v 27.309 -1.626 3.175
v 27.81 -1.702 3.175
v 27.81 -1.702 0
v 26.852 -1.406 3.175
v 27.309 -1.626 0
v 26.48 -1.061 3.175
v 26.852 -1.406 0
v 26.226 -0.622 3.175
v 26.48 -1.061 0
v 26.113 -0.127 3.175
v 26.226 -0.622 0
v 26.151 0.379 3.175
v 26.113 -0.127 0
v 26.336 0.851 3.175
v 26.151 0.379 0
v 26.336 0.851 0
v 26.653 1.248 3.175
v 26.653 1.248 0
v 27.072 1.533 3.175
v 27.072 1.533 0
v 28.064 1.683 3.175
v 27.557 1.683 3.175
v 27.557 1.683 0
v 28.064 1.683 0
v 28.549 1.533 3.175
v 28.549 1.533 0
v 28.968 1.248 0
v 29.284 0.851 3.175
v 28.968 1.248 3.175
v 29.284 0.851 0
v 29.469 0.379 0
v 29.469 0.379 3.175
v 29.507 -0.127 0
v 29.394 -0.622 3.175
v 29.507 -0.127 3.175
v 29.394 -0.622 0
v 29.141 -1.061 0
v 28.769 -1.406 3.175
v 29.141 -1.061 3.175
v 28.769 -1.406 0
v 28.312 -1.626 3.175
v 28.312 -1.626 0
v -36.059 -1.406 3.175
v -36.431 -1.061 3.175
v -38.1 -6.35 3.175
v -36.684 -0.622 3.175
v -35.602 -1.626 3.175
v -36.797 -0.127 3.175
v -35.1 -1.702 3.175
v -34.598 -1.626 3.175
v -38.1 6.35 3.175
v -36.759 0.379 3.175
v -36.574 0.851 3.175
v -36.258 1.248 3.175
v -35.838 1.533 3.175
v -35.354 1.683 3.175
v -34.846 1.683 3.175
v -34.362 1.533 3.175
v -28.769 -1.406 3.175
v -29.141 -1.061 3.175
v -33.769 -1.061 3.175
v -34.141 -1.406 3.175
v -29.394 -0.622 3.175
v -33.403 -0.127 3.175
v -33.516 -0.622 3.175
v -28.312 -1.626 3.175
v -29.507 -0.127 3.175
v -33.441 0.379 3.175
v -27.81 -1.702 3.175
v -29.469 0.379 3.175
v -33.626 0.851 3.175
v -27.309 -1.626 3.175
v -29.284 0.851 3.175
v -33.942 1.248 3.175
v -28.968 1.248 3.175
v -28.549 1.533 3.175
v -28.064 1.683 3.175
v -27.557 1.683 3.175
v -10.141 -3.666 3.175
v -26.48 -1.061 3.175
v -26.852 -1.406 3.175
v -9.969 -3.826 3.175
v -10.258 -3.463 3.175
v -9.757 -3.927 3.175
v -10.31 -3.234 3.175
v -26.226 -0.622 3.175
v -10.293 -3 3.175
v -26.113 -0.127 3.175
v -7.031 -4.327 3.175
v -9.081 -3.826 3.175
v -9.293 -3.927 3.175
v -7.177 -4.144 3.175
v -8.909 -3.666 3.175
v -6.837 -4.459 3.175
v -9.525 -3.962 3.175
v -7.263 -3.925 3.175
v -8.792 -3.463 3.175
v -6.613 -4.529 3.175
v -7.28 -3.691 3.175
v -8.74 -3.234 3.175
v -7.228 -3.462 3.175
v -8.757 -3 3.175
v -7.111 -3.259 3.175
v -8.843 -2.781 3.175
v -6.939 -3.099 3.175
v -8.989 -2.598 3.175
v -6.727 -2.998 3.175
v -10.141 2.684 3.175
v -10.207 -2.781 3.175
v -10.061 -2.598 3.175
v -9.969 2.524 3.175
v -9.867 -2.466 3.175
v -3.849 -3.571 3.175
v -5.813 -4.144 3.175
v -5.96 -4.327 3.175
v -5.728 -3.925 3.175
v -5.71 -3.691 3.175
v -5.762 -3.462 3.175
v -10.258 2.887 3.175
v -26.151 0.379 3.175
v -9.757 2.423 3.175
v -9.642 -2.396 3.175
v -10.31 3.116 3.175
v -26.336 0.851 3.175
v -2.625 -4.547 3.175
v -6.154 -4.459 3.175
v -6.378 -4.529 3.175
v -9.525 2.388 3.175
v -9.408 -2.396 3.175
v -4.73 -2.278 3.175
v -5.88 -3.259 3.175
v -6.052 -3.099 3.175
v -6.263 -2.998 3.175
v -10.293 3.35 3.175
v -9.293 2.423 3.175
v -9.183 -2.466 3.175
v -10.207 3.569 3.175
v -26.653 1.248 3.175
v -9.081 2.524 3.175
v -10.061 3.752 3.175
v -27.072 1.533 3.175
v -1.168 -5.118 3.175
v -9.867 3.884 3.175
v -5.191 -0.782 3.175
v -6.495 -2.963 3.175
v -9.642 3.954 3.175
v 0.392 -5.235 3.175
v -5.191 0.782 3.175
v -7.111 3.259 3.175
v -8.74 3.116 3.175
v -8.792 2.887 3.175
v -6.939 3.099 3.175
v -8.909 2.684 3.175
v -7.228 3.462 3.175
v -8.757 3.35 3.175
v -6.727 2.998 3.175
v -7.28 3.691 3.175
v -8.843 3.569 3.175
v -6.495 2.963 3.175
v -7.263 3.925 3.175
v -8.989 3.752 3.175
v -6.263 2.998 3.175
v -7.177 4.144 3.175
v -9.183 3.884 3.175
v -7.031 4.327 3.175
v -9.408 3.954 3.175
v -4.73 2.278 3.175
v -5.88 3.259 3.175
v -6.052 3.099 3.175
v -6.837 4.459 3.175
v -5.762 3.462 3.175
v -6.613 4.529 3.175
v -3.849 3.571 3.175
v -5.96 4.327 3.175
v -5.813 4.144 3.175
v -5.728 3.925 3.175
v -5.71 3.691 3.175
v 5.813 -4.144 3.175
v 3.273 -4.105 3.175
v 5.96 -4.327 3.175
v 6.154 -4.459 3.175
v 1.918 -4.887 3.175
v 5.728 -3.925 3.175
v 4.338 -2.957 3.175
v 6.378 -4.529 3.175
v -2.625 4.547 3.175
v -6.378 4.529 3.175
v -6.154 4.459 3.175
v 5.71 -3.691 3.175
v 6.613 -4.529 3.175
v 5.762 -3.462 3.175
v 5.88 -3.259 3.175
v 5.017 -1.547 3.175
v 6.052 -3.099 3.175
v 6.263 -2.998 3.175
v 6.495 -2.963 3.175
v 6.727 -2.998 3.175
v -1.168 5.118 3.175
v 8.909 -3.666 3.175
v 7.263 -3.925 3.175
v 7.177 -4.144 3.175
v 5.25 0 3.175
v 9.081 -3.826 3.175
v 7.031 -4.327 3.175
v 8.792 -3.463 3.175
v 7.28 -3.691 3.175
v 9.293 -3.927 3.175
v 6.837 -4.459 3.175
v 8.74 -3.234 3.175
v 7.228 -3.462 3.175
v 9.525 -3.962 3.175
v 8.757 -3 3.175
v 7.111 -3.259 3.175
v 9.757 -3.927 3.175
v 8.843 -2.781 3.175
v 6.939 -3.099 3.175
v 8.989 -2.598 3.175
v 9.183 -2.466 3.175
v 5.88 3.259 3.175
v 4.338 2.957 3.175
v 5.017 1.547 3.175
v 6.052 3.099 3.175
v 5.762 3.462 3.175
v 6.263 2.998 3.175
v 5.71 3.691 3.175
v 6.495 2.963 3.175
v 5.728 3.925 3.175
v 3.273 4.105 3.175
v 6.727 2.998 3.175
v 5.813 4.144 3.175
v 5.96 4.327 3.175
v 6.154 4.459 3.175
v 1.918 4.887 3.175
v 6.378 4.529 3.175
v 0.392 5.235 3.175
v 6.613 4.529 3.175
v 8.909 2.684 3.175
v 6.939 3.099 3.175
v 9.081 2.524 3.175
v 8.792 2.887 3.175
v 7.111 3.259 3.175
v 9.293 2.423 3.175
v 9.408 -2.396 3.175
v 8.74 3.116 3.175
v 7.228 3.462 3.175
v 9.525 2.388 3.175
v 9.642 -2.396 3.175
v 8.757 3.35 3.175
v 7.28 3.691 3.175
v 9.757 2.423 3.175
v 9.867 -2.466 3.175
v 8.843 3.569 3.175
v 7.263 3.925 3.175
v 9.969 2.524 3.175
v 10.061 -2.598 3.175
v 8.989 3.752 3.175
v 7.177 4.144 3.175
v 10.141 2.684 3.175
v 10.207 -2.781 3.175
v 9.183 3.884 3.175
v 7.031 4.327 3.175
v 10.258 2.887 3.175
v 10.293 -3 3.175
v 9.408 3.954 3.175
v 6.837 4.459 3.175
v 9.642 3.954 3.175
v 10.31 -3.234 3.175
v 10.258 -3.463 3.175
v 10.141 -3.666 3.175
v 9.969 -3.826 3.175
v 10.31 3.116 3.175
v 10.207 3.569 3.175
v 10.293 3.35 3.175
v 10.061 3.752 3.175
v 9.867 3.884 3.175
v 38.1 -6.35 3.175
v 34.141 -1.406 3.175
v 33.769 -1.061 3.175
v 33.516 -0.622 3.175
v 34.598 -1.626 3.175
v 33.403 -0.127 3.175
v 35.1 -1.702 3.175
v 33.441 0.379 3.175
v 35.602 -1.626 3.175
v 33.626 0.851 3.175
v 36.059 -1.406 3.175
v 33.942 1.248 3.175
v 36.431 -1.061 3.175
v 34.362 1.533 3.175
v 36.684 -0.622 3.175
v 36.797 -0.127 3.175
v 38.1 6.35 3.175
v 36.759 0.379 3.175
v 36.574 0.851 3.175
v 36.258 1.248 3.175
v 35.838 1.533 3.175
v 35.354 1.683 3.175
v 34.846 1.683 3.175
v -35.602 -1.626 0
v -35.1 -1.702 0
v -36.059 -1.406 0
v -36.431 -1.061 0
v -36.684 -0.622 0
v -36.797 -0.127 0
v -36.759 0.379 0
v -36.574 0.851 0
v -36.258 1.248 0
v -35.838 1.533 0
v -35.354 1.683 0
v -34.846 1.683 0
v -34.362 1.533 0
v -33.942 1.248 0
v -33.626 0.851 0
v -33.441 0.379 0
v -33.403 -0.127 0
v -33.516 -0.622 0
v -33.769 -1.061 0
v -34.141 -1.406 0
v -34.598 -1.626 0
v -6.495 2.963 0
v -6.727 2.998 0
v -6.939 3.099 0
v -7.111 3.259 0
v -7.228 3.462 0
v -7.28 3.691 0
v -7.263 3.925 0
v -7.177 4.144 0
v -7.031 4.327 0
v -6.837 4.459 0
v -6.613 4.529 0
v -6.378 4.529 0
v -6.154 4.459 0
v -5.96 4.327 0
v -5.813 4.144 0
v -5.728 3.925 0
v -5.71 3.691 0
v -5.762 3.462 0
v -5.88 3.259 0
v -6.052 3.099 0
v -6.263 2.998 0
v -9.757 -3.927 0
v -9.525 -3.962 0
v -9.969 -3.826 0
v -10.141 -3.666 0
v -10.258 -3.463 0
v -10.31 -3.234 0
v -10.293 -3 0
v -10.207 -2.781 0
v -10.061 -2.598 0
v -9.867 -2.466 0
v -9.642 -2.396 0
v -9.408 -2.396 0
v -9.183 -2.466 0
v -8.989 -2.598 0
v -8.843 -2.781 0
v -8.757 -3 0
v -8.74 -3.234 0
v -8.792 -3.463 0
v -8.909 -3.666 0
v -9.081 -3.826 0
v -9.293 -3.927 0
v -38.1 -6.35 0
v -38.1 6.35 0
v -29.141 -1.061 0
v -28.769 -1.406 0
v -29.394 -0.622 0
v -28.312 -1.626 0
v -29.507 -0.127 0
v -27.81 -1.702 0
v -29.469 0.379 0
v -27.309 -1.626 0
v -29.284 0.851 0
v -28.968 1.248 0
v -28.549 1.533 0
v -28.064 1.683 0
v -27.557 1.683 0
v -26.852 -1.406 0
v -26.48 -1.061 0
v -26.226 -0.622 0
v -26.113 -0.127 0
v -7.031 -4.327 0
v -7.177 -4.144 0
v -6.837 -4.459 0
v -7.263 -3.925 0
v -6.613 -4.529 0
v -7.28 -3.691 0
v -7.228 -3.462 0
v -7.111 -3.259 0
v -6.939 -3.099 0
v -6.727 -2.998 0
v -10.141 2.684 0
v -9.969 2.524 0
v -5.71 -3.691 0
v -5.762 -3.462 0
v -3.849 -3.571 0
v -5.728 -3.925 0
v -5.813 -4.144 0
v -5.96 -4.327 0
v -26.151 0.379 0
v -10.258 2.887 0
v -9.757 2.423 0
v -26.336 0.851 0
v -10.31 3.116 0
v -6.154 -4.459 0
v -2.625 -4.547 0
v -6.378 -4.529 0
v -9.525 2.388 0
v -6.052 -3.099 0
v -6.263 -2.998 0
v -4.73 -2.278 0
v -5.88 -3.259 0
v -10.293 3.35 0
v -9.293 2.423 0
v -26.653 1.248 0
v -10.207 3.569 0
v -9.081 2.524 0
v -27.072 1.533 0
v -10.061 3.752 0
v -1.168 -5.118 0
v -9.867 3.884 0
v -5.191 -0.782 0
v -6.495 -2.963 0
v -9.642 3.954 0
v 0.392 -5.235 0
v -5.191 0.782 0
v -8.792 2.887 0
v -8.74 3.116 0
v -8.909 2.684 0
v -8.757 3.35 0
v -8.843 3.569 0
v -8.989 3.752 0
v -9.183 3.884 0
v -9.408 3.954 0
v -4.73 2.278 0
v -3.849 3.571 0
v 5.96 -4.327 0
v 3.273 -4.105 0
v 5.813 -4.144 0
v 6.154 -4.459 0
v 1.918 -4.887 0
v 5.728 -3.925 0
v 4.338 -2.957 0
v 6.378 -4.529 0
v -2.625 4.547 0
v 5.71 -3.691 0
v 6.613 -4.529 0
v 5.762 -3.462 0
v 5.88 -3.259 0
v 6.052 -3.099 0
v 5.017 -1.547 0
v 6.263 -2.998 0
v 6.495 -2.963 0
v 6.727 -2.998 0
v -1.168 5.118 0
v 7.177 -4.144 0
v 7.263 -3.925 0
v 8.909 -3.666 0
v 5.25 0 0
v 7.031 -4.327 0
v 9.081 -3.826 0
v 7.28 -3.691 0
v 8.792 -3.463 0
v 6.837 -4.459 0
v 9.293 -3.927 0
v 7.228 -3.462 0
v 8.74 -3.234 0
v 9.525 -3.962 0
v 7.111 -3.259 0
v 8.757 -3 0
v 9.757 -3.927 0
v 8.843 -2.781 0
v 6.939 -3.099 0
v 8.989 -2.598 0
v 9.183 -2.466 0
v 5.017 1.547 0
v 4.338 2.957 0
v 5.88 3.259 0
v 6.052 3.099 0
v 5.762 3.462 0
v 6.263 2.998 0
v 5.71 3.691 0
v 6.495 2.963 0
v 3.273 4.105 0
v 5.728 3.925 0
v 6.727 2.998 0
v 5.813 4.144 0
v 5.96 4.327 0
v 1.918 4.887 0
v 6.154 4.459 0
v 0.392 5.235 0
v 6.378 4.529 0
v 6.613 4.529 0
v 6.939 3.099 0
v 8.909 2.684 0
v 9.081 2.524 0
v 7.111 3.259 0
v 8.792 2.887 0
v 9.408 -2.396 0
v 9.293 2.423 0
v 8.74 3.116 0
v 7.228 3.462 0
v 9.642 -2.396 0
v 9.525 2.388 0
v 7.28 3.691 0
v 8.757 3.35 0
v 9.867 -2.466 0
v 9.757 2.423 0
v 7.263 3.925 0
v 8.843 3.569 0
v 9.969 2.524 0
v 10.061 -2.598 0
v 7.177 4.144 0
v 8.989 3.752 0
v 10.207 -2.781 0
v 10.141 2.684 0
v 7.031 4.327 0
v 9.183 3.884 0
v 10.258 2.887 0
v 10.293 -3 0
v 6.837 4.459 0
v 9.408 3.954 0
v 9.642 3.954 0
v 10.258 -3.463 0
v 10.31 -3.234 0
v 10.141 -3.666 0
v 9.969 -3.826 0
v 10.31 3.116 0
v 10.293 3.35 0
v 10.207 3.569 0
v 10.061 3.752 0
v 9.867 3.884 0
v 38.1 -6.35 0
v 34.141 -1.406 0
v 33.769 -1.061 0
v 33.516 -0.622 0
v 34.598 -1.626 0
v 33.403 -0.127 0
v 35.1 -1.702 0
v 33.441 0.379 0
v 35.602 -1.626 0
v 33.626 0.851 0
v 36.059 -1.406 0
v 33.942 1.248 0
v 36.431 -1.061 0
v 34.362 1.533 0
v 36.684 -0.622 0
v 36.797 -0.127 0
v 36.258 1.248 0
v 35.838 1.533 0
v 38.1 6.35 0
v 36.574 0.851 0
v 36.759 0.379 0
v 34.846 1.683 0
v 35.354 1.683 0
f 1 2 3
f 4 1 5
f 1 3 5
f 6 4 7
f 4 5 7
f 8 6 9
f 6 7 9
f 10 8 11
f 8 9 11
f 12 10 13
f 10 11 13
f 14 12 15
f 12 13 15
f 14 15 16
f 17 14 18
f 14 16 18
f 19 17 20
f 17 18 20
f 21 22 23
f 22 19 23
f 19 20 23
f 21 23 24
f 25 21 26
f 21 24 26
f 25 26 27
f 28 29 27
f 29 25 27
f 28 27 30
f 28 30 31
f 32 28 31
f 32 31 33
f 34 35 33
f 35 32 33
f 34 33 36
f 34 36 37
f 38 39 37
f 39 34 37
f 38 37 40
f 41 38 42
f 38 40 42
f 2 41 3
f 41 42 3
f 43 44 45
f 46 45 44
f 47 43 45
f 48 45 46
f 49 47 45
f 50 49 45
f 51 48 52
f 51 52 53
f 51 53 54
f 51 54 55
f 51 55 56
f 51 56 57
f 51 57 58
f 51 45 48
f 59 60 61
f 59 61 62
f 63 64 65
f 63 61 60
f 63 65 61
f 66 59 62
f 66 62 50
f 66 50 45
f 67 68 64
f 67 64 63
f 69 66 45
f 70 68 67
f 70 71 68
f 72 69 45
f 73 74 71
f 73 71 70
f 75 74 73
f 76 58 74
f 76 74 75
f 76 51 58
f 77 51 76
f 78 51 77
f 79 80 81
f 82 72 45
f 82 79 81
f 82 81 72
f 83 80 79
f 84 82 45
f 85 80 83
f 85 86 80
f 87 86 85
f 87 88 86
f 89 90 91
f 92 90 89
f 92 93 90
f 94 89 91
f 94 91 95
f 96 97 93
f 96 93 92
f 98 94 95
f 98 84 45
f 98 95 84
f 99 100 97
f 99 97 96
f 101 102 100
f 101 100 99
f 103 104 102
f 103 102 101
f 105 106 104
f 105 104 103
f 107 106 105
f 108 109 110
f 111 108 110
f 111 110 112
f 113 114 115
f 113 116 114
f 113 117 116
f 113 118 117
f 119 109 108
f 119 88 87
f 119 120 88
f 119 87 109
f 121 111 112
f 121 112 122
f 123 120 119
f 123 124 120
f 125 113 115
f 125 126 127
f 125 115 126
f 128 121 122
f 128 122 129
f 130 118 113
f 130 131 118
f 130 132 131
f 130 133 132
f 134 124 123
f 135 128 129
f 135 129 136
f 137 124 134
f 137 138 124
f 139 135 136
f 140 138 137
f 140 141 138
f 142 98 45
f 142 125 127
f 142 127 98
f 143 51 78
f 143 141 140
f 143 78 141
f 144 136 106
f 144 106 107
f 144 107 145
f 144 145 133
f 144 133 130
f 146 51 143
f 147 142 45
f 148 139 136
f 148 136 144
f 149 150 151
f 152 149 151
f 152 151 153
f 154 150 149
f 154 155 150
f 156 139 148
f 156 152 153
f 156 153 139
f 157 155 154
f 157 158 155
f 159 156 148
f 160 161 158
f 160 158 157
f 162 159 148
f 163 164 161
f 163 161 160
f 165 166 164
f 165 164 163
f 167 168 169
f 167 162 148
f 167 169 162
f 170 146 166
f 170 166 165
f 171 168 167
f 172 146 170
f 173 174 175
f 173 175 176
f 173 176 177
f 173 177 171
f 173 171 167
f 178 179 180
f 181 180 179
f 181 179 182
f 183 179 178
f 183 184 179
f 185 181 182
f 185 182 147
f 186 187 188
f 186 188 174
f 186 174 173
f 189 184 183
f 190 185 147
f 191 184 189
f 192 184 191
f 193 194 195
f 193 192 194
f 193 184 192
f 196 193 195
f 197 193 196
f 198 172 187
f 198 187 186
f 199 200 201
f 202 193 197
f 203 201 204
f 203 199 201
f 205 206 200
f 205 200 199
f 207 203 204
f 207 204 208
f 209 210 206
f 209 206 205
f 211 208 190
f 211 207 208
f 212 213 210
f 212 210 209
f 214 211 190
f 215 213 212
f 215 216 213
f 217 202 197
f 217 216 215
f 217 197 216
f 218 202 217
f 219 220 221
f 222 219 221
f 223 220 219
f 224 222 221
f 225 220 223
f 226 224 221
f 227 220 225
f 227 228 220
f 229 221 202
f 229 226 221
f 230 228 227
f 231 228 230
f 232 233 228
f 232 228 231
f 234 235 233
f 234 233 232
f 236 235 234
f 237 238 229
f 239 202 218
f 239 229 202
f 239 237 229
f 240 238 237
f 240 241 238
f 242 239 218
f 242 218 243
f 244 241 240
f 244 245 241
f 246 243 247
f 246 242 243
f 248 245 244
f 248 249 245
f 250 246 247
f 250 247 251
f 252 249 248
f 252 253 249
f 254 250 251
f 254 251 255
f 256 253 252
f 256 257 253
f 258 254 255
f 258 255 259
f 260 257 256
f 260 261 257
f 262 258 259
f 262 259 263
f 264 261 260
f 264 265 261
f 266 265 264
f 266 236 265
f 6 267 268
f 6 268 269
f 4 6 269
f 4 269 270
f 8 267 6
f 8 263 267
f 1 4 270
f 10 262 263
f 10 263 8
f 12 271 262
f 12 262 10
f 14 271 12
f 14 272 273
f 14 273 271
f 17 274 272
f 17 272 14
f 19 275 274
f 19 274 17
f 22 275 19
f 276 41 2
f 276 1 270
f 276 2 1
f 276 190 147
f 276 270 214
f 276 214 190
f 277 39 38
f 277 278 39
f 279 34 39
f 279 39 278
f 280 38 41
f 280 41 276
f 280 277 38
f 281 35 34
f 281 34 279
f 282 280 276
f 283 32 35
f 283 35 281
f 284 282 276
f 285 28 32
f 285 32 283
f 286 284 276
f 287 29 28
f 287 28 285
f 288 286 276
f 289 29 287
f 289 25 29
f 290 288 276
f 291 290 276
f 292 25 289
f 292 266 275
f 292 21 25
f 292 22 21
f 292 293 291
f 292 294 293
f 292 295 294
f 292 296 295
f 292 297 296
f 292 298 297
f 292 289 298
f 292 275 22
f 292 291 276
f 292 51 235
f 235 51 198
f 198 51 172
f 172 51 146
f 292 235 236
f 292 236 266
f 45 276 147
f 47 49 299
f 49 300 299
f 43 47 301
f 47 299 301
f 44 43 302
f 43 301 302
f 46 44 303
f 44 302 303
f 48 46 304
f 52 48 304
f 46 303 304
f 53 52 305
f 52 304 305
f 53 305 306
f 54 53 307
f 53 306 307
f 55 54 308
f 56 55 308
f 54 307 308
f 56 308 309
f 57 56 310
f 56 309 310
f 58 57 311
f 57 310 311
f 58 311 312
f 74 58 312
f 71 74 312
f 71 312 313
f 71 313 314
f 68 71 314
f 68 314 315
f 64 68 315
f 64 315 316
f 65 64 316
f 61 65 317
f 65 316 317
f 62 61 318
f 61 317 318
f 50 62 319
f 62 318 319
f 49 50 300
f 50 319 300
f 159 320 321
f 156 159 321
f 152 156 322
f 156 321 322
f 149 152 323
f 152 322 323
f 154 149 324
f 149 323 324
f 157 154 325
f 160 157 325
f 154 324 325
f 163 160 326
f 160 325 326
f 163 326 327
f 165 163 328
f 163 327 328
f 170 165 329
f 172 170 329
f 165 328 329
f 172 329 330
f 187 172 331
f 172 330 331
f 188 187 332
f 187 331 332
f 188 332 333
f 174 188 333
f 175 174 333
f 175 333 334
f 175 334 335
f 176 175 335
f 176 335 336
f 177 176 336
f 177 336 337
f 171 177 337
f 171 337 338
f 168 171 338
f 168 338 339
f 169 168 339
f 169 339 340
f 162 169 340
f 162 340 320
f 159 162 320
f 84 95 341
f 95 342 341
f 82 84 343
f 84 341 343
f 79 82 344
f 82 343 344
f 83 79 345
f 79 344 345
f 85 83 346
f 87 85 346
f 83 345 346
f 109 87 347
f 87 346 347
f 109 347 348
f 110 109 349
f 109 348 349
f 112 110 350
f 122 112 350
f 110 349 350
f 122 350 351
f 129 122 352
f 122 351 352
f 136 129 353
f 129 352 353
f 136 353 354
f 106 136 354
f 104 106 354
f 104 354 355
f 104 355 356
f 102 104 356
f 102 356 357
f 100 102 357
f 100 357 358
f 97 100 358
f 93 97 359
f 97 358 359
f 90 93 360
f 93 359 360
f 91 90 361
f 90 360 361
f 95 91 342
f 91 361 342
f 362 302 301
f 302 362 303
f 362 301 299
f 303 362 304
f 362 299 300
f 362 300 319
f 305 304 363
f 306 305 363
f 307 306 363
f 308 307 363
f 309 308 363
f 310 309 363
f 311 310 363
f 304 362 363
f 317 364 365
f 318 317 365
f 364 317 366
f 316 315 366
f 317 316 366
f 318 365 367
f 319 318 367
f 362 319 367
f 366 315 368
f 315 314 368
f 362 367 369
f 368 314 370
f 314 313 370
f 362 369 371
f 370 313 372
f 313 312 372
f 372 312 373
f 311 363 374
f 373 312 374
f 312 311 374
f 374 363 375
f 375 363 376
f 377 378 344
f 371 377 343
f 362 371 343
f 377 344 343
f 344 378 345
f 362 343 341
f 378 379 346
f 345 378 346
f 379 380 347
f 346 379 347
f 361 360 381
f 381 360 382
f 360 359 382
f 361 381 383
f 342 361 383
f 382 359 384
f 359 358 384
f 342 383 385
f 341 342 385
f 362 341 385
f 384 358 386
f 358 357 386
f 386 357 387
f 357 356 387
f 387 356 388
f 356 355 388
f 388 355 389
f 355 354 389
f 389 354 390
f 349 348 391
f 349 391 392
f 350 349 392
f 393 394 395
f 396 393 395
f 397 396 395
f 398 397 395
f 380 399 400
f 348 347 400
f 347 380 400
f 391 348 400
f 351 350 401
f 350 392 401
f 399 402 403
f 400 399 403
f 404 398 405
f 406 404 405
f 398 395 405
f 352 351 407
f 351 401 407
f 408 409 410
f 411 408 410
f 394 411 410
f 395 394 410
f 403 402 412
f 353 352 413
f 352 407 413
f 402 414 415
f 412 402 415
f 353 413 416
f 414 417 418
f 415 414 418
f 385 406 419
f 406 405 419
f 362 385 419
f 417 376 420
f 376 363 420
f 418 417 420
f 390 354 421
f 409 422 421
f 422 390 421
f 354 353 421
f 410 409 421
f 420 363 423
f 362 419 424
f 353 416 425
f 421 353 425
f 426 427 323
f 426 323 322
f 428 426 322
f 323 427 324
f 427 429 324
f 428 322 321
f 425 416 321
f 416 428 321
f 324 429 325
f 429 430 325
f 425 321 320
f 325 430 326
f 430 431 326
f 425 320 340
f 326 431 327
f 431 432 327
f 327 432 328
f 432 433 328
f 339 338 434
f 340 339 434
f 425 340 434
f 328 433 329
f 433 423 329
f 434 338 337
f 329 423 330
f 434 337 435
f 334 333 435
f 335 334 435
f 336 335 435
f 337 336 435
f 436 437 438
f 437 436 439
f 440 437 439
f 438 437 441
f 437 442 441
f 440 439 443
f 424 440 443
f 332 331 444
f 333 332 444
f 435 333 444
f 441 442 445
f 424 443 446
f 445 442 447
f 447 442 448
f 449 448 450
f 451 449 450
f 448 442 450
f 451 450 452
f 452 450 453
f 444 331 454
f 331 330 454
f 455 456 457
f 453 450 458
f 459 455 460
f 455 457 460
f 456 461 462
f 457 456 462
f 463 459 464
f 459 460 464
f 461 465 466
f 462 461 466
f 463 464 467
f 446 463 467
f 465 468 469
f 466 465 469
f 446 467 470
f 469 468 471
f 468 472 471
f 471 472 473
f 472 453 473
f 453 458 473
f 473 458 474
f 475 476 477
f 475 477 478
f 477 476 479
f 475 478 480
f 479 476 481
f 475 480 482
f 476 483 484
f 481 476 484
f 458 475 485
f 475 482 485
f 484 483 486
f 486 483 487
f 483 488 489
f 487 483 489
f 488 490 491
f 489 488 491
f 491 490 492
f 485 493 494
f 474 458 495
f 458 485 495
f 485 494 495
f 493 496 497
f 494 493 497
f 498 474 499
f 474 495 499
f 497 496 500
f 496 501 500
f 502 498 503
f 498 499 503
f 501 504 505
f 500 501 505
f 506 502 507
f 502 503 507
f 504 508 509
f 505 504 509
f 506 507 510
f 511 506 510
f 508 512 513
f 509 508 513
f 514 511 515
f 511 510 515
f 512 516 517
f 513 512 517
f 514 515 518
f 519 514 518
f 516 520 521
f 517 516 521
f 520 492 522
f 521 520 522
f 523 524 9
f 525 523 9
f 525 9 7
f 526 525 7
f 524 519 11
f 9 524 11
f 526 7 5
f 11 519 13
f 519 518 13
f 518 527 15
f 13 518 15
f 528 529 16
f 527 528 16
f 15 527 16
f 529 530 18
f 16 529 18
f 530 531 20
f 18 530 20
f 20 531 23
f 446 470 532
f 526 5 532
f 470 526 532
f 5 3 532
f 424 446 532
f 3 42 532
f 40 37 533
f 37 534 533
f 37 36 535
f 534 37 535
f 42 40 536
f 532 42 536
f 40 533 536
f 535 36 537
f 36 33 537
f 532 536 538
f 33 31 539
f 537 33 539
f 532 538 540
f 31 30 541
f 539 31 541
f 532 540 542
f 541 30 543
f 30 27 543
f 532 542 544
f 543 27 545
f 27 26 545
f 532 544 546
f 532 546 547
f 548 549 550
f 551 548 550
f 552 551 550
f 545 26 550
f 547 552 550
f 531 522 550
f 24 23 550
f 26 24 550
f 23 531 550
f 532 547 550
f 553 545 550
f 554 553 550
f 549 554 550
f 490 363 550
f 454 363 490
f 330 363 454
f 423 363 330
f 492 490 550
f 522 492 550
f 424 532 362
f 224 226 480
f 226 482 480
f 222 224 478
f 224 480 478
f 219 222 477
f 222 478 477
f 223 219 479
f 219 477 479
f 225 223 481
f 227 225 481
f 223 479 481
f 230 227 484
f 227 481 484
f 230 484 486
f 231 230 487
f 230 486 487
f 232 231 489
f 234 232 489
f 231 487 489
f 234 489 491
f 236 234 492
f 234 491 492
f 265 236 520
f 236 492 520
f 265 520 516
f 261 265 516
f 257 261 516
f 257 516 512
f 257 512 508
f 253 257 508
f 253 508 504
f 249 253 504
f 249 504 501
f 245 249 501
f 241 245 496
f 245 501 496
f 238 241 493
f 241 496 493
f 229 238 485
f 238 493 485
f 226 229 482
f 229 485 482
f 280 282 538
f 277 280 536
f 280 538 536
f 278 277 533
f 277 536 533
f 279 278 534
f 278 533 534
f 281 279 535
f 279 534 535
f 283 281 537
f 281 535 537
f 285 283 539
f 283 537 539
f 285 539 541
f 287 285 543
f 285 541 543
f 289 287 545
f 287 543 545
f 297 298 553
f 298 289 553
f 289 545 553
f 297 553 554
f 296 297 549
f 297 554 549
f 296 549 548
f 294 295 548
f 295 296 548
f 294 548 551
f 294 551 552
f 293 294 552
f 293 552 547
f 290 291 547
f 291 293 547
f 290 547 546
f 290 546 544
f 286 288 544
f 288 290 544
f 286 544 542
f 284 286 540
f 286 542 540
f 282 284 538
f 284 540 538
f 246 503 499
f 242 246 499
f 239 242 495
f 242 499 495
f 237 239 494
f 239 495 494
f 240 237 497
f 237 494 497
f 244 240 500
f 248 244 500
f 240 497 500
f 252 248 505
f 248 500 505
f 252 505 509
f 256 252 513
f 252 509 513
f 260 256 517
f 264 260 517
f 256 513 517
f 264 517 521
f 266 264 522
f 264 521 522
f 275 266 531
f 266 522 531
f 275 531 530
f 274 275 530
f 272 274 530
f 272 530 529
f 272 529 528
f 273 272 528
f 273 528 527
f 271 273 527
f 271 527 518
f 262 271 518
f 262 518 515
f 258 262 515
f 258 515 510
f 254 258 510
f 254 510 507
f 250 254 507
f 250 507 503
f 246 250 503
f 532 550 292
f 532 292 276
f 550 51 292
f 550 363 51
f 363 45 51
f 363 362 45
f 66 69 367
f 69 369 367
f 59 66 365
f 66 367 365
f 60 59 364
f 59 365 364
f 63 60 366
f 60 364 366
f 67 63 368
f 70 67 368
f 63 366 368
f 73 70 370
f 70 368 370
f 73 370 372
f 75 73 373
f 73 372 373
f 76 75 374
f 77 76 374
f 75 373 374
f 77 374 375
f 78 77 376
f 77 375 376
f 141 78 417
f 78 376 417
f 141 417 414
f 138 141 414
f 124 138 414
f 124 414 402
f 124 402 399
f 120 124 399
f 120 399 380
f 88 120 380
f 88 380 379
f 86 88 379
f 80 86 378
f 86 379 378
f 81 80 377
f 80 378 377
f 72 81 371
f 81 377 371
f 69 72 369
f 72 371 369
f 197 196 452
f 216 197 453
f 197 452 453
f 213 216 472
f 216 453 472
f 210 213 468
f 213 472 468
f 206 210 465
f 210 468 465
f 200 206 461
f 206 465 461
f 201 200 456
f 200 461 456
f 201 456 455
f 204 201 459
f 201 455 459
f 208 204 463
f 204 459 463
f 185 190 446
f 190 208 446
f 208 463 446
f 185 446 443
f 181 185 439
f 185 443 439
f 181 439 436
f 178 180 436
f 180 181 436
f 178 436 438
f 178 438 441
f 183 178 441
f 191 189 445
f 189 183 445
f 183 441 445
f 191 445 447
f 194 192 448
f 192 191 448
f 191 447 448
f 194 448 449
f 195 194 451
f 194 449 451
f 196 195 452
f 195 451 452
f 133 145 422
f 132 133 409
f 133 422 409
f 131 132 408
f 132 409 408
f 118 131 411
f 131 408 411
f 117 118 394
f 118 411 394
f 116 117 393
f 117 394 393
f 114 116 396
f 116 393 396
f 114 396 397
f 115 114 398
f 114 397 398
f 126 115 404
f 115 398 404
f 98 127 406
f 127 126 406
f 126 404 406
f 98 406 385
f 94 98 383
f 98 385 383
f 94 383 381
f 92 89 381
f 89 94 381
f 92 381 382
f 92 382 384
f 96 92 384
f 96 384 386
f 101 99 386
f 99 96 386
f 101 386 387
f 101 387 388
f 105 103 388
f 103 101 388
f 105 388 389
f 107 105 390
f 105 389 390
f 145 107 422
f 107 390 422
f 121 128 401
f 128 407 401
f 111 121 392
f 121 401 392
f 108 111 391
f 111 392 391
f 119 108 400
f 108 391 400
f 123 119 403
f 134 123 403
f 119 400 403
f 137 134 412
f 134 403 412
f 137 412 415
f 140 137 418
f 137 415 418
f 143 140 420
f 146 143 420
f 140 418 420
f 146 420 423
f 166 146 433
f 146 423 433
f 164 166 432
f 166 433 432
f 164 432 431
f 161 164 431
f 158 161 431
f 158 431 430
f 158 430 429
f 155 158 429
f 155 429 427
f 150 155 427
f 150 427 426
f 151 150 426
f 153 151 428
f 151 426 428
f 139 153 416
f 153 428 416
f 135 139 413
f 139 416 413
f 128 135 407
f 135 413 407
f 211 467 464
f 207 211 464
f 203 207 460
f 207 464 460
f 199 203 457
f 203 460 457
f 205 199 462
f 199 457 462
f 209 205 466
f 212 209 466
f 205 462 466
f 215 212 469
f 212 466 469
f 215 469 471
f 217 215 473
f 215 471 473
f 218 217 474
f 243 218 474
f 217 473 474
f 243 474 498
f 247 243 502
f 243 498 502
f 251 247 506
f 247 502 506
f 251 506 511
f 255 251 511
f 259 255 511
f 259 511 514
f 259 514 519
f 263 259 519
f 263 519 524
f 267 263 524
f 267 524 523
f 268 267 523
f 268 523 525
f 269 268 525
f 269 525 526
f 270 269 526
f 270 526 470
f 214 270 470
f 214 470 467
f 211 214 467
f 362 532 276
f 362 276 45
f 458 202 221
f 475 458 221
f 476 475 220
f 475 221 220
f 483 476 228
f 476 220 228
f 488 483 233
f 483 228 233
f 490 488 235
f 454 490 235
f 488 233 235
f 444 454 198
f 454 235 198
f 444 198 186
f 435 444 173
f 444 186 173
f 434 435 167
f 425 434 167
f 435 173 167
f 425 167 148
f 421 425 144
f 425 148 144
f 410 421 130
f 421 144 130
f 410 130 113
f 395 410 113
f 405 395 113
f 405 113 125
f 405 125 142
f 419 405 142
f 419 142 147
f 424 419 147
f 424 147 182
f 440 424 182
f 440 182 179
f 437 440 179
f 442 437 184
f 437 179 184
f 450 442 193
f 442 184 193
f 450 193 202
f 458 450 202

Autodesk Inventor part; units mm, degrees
ref_plane "YZ Plane" through (0, 0, 0) normal (1, 0, 0) x (0, 1, 0)
sketch "Sketch1" plane through (0, 0, 0) normal (0, 0, 1) x (1, 0, 0)
  circle A0 centre (0, 0) radius 6.477 construction
  circle A1 centre (0, 0) radius 4.75 construction
  circle A2 centre (0, 0) radius 9.525 construction
  line L0 (-38.1, -6.35) -> (38.1, -6.35) construction
  line L1 (38.1, -6.35) -> (38.1, 6.35) construction
  line L2 (38.1, 6.35) -> (-38.1, 6.35) construction
  line L3 (-38.1, 6.35) -> (-38.1, -6.35) construction
  line L4 (-38.1, 6.35) -> (38.1, 6.35)
  line L5 (38.1, 6.35) -> (38.1, -6.35)
  line L6 (38.1, -6.35) -> (-38.1, -6.35)
  line L7 (-38.1, -6.35) -> (-38.1, 6.35)
  dimension "d0" = 12.954
  dimension "d1" = 9.5
  dimension "d2" = 19.05
  dimension "d3" = 76.2
  dimension "d4" = 12.7
extrude "Extrusion1" add sketch "Sketch1" along normal blind 3.175
sketch "Sketch2" plane through (0, 0, 3.175) normal (0, 0, 1) x (1, 0, 0)
  circle A0 centre (0, 0) radius 5.25
  dimension "d7" = 10.5
extrude "Extrusion2" cut sketch "Sketch2" against normal through all
sketch "Sketch4" plane through (0, 0, 3.175) normal (0, 0, 1) x (1, 0, 0)
  circle A0 centre (0, 0) radius 5.25 projected
  circle A1 centre (0, 0) radius 7.5 construction
  arc A2 (6.4952, 3.75) -> (-6.4952, 3.75) centre (0, 0) ccw construction
  line L0 (0, 0) -> (6.4952, 3.75) construction
  line L1 (0, 0) -> (7.5, 0) construction
  line L2 (0, 0) -> (-6.4952, 3.75) construction
  point P0 (6.4952, 3.75)
  dimension "d13" = 15
  dimension "d14" = 30
  dimension "d15" = 120
hole "Hole1" at (-6.4952, 3.75, 3.175) at (6.4952, 3.75, 3.175) direction (0, 0, -1) diameter 1.5748 end through all
sketch "Sketch5" plane through (0, 0, 3.175) normal (0, 0, 1) x (1, 0, 0)
  circle A0 centre (6.4952, 3.75) radius 0.7874 projected
  circle A1 centre (-6.4952, 3.75) radius 0.7874 projected
  circle A2 centre (0, 0) radius 5.25 projected
  line L0 (38.1, -6.35) -> (-38.1, -6.35) projected
  line L1 (38.1, 6.35) -> (38.1, -6.35) projected
  line L2 (-38.1, 6.35) -> (38.1, 6.35) projected
  line L3 (-38.1, -6.35) -> (-38.1, 6.35) projected
  line L4 (-30.9265, 0) -> (29.6642, 0) construction
ref_plane "Work Plane1" through (-30.9265, 0, 3.175) normal (0, -1, 0) x (1, 0, 0)
mirror "Mirror1" about plane through (-30.9265, 0, 3.175) normal (0, -1, 0) of "Hole1"
sketch "Sketch6" plane through (0, 0, 3.175) normal (0, 0, 1) x (1, 0, 0)
  line L0 (-35.1, 0) -> (-27.8102, 0)
  line L1 (-27.8102, 0) -> (-27.8102, 2.0321)
  line L2 (-27.8102, 2.0321) -> (-35.1, 2.0321)
  line L3 (-35.1, 2.0321) -> (-35.1, 0)
  line L4 (-38.1, -6.35) -> (-38.1, 6.35) projected
  dimension "d39" = 7.2898
  dimension "d40" = 3
hole "Hole2" at (-35.1, 0, 3.175) at (-27.8102, 0, 3.175) direction (0, 0, -1) diameter 3.4036 end through all clearance for "Flat Head Machine Screw" size "M3" standard "Ansi Metric M Profile"
sketch "Sketch7" plane through (0, 0, 3.175) normal (0, 0, 1) x (1, 0, 0)
  circle A0 centre (-27.8102, 0) radius 1.7018 projected
  circle A1 centre (-35.1, 0) radius 1.7018 projected
  circle A2 centre (6.4952, -3.75) radius 0.7874 projected
  circle A3 centre (-6.4952, -3.75) radius 0.7874 projected
  circle A4 centre (6.4952, 3.75) radius 0.7874 projected
  circle A5 centre (-6.4952, 3.75) radius 0.7874 projected
  circle A6 centre (0, 0) radius 5.25 projected
  line L0 (38.1, -6.35) -> (-38.1, -6.35) projected
  line L1 (38.1, 6.35) -> (38.1, -6.35) projected
  line L2 (-38.1, 6.35) -> (38.1, 6.35) projected
  line L3 (-38.1, -6.35) -> (-38.1, 6.35) projected
  line L4 (0, 12.6269) -> (0, -12.6269) construction
ref_plane "Work Plane2" through (0, 12.6269, 3.175) normal (-1, 0, 0) x (0, -1, 0)
mirror "Mirror2" about plane through (0, 12.6269, 3.175) normal (-1, 0, 0) of "Hole2"
sketch "Sketch8" plane through (0, 0, 3.175) normal (0, 0, 1) x (1, 0, 0)
  point P0 (-9.525, -3.175)
  point P1 (-9.525, 3.175)
  point P2 (9.525, 3.175)
  point P3 (9.525, -3.175)
hole "Hole3" at (-9.525, 3.175, 3.175) at (-9.525, -3.175, 3.175) at (9.525, -3.175, 3.175) at (9.525, 3.175, 3.175) direction (0, 0, -1) diameter 1.5748 end through all
properties part number "simple_chuck_force_bridge"
